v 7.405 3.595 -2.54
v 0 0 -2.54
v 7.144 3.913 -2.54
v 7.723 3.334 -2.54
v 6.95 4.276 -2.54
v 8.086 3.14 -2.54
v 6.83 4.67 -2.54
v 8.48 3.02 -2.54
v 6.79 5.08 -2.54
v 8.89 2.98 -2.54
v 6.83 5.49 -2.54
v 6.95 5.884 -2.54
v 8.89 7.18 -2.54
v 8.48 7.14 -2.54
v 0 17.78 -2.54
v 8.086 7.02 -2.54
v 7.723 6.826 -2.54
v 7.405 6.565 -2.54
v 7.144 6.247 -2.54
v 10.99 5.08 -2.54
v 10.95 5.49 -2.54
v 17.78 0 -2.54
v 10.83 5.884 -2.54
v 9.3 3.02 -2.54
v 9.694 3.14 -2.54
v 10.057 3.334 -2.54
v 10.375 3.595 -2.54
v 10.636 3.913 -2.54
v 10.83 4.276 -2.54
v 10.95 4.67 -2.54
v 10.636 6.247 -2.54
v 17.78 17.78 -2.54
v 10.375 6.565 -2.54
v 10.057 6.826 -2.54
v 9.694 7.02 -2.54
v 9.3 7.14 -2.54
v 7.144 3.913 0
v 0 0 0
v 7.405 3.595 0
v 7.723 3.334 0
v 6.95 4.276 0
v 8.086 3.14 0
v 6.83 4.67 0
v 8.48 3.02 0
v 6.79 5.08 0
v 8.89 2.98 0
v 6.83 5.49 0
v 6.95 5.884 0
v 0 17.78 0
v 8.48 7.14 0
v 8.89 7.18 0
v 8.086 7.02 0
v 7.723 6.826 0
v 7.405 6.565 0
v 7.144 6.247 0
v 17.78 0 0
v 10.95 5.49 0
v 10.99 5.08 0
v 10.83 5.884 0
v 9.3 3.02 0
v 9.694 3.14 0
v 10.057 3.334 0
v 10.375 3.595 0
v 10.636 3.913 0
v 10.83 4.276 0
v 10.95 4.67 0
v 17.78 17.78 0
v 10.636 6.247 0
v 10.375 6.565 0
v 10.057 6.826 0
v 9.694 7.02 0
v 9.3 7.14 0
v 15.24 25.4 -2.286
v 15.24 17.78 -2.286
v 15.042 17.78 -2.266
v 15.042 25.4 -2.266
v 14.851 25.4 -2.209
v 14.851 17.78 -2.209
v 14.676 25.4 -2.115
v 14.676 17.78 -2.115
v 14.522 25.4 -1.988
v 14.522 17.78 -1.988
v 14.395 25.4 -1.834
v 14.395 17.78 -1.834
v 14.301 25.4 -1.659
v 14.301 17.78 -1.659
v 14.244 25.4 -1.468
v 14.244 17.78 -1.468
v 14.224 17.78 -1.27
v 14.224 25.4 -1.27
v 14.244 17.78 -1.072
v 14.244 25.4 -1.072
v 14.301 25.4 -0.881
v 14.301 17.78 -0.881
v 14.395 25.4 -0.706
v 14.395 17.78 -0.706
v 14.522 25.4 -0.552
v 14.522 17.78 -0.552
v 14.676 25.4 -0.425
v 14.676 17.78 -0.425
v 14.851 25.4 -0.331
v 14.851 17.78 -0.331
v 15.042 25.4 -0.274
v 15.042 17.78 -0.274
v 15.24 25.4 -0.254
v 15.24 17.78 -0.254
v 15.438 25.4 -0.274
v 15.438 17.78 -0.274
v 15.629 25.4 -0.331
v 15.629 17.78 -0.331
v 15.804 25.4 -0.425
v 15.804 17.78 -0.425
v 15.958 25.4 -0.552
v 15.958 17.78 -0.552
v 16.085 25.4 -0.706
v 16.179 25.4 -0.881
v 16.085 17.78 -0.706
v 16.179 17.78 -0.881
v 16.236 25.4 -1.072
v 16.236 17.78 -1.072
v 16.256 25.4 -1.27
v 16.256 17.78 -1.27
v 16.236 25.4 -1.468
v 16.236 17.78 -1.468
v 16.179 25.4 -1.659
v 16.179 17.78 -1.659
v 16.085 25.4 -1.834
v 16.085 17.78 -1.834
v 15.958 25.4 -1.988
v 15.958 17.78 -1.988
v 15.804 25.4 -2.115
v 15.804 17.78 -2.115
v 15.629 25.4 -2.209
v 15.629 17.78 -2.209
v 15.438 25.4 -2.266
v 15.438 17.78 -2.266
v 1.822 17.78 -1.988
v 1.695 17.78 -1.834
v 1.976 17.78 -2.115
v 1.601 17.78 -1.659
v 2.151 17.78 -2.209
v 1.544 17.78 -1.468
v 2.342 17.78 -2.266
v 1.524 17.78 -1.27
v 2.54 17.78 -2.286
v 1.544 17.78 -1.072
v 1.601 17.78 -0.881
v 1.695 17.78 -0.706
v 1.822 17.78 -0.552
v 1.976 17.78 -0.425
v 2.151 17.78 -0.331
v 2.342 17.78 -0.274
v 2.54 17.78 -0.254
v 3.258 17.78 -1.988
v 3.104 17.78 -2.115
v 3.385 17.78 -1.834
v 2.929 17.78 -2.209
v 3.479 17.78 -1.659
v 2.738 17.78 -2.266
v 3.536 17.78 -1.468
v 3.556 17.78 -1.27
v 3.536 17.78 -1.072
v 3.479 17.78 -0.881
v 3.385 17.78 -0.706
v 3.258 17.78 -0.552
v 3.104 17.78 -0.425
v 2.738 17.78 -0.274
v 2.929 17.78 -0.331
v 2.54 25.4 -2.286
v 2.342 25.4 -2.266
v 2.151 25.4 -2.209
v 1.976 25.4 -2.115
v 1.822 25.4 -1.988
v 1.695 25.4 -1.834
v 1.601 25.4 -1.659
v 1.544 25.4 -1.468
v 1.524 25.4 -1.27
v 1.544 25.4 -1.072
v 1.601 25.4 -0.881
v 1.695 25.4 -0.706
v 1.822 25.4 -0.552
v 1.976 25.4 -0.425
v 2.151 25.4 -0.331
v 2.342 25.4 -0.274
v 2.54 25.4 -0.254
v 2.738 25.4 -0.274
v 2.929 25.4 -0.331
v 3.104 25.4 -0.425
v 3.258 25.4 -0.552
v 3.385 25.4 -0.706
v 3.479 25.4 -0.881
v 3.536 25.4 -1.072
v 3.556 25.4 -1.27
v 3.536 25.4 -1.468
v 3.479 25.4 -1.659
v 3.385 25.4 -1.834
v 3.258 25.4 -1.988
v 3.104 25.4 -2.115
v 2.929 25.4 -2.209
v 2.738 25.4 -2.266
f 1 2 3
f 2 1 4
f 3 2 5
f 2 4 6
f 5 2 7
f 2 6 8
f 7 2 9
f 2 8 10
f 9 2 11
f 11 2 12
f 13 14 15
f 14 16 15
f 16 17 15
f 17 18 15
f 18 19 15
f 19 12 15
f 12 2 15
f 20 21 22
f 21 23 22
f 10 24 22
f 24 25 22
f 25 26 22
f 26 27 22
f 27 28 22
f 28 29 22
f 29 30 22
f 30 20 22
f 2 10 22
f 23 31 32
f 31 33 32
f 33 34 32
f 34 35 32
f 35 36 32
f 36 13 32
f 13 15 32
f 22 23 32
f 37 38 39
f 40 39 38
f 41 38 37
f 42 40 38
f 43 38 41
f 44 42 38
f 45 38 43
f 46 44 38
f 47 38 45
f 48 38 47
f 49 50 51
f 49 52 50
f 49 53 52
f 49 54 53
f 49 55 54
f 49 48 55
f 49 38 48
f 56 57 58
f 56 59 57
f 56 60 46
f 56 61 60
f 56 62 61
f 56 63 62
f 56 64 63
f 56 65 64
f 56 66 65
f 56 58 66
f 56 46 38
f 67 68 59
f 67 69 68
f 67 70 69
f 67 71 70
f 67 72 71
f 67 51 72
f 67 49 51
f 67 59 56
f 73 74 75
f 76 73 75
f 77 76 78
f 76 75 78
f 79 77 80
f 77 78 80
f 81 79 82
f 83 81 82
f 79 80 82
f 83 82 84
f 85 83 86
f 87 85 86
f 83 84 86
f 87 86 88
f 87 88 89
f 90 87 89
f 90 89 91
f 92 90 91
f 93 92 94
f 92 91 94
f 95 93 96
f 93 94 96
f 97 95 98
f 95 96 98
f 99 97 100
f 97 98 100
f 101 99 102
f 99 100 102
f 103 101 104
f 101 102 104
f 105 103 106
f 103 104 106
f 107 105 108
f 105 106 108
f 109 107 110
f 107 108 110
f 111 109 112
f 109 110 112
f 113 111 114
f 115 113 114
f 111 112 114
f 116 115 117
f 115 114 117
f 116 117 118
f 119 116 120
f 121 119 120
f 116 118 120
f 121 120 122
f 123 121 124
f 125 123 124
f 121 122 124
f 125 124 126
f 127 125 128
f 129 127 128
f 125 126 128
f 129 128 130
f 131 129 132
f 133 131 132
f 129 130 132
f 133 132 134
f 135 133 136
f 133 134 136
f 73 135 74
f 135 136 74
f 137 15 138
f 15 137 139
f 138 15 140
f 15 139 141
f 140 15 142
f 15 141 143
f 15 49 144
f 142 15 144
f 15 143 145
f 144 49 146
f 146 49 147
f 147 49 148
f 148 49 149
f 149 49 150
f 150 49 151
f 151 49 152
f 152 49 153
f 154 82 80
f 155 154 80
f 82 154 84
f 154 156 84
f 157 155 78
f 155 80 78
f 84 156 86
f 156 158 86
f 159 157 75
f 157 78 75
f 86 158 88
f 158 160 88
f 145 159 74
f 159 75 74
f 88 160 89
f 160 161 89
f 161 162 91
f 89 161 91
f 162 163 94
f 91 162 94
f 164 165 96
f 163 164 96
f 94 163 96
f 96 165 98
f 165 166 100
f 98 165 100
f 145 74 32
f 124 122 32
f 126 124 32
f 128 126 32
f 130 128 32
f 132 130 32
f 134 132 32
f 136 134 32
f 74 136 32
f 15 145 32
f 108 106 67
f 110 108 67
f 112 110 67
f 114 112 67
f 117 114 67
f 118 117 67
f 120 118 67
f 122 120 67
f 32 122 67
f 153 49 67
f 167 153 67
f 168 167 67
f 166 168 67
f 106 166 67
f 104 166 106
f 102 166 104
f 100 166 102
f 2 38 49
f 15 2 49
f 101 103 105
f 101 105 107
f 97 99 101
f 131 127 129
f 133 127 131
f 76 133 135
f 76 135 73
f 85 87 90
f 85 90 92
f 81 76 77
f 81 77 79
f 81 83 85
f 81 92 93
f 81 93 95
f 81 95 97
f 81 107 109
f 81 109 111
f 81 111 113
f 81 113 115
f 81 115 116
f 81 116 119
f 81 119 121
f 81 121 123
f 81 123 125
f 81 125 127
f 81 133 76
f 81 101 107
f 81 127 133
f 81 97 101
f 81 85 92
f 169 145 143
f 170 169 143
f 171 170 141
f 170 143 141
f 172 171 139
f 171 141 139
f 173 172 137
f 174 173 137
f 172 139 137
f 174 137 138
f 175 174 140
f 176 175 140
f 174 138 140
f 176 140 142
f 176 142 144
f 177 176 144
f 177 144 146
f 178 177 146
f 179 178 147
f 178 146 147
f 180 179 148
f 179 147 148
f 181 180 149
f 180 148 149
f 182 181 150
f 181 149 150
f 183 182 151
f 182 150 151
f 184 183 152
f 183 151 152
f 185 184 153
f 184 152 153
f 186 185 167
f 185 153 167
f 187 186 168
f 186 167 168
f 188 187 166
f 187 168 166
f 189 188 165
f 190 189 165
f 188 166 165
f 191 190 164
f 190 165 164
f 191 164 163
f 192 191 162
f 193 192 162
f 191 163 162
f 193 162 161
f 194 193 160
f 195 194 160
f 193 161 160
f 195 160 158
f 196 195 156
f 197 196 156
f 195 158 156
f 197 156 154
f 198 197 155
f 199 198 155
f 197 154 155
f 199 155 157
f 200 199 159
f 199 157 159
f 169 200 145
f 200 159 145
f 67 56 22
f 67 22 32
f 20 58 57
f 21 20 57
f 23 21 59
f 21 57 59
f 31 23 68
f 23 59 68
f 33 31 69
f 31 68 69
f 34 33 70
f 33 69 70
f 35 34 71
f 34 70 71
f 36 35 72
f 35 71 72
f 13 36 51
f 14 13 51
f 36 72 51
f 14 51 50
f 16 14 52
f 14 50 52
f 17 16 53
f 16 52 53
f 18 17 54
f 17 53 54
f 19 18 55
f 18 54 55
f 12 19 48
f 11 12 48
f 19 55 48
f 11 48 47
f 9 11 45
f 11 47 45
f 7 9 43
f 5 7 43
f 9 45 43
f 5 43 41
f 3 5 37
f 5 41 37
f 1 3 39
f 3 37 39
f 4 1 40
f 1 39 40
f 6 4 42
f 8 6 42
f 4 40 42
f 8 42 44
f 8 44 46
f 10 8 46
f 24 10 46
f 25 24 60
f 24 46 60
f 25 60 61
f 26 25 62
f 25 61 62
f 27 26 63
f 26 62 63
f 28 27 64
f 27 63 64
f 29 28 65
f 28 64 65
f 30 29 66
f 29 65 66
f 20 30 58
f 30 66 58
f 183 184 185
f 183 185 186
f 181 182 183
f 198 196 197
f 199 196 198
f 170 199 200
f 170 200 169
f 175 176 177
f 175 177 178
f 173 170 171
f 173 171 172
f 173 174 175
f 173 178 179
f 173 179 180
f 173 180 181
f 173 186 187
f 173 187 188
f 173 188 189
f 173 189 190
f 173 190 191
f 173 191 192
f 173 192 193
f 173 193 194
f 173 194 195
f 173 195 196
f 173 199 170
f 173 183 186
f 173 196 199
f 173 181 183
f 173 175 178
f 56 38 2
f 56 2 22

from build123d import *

# Parameters (mm, degrees)
SKETCH1_W           = 17.78
SKETCH1_H           = 17.78
SKETCH1_R           = 2.0999958
BOSS_EXTRUDE1_DEPTH = 2.54
SKETCH2_R           = 1.016
BOSS_EXTRUDE2_DEPTH = 7.62


with BuildPart() as part:
    # Sketch1 → Boss-Extrude1 (new body)
    with BuildSketch(Plane.XY):
        with Locations((8.89, 8.89)):
            Rectangle(SKETCH1_W, SKETCH1_H)
        with Locations((8.89, 5.08)):
            Circle(SKETCH1_R, mode=Mode.SUBTRACT)
    extrude(amount=-BOSS_EXTRUDE1_DEPTH)

    # Sketch2 → Boss-Extrude2 (add)
    with BuildSketch(Plane(origin=(0, 17.78, 0), x_dir=(1, 0, 0), z_dir=(0, 1, 0))):
        with Locations(Location((2.54, 1.27, 0), (0, 0, 90))):
            Circle(SKETCH2_R)
        with Locations(Location((15.24, 1.27, 0), (0, 0, 90))):
            Circle(SKETCH2_R)
    extrude(amount=BOSS_EXTRUDE2_DEPTH)


solid = part.part
